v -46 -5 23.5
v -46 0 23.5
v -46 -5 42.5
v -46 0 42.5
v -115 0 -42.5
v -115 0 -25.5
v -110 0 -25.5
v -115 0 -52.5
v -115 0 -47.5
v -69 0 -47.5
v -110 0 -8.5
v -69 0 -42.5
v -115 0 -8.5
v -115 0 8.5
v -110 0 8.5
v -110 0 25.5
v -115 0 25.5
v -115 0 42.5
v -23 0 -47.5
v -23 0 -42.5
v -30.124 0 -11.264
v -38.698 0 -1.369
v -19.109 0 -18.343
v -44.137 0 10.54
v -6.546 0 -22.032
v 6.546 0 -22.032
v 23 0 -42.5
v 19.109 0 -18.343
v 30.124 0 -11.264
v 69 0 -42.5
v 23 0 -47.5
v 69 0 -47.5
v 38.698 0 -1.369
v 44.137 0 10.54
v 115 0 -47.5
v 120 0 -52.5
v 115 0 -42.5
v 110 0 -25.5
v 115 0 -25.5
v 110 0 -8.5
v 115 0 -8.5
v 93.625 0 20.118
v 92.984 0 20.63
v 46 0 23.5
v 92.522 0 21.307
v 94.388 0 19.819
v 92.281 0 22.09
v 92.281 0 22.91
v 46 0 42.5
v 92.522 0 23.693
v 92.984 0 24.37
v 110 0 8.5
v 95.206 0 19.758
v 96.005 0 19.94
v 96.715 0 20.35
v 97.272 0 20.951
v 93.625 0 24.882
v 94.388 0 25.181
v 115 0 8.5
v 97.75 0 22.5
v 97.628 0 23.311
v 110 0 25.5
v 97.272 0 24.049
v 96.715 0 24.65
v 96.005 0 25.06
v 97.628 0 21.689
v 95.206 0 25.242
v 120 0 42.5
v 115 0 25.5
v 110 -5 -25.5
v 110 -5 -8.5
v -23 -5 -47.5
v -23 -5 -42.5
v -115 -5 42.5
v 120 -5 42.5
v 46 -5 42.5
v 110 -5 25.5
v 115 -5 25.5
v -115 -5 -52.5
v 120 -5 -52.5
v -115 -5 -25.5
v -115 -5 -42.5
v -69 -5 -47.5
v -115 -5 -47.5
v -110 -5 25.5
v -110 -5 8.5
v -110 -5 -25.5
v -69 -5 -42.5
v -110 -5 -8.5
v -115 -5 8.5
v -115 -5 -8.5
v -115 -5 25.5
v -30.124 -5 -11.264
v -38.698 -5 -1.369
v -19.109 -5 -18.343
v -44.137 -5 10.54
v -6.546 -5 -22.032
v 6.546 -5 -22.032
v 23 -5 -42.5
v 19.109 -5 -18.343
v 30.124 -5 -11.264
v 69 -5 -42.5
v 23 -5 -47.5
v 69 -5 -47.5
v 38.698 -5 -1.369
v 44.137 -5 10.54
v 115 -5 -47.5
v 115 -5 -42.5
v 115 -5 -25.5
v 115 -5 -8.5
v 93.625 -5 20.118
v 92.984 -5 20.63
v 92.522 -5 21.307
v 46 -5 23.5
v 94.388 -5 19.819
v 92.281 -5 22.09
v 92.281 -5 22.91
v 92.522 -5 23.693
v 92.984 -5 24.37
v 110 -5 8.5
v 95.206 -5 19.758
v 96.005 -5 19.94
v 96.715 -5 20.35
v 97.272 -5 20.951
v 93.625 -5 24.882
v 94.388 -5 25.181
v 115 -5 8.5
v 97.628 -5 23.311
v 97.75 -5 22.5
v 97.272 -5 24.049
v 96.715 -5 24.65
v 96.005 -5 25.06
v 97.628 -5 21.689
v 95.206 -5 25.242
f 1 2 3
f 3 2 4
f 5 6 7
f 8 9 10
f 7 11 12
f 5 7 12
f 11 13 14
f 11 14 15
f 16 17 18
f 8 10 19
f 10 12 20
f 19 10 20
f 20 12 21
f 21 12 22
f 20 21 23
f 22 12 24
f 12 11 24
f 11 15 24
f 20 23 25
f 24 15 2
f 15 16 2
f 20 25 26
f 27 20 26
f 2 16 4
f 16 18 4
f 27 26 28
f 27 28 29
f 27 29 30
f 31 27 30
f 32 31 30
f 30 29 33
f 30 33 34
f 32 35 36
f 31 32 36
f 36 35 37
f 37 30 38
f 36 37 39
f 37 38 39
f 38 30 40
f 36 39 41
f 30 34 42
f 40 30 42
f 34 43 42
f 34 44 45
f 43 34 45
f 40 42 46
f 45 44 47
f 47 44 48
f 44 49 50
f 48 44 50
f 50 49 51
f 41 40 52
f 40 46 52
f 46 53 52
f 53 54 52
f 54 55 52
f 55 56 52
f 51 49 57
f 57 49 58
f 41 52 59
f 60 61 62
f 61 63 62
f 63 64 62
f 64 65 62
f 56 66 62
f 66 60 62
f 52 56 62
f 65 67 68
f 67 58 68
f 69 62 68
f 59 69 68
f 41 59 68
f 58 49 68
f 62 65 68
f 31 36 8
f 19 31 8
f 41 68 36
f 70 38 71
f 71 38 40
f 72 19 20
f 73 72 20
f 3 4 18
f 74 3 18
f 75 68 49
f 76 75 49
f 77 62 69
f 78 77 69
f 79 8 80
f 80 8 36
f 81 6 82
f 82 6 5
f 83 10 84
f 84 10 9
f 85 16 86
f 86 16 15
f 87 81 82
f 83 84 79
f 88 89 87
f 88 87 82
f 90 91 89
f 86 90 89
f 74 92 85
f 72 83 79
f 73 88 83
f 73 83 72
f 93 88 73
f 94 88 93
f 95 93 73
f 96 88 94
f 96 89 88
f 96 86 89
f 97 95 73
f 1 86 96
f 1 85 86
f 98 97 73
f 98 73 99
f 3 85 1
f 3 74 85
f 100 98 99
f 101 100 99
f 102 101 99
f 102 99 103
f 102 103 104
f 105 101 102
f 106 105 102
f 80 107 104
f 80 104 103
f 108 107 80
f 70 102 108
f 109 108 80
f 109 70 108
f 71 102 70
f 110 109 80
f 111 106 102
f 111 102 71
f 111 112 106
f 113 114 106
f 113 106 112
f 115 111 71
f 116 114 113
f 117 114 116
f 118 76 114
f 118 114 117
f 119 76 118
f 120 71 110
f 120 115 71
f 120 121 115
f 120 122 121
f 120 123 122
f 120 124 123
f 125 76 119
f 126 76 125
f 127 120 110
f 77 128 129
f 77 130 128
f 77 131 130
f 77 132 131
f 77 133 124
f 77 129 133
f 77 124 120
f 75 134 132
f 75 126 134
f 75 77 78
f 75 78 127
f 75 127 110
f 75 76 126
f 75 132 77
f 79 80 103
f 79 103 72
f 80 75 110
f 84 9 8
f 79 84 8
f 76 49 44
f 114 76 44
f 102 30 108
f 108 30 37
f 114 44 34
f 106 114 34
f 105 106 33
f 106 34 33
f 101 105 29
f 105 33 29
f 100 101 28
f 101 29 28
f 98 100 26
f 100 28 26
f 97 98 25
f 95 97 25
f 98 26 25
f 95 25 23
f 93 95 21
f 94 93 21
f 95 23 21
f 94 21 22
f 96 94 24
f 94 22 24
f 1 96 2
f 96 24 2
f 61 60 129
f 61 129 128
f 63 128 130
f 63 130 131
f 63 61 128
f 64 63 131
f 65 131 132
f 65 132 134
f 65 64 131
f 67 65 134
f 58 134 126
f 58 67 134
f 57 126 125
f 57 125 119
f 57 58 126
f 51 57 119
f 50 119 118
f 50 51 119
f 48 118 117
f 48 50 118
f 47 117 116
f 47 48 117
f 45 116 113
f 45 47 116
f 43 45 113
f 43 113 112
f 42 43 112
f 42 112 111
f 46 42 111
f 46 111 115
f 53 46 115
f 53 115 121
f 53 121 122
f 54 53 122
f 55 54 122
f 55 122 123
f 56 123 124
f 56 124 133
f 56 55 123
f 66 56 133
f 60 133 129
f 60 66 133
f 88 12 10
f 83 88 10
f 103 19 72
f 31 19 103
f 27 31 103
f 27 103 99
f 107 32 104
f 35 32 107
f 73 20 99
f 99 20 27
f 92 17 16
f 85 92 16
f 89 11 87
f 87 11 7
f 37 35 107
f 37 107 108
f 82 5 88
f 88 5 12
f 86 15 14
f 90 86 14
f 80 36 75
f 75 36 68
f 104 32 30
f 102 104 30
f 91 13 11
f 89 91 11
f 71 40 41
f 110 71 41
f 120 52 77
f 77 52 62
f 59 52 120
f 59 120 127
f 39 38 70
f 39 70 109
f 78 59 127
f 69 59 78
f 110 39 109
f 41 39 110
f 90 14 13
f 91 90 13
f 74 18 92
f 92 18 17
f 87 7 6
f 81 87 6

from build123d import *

# Parameters (mm, degrees)
F0_W     = 46
F0_H     = 5
F0_W_2   = 5
F0_H_2   = 17
F0_R     = 2.75
F1_DEPTH = 5


with BuildPart() as f1:
    # F0 (on Front) → F1 (new body)
    with BuildSketch(Plane.XZ):
        with BuildLine():
            Line((115, 42.5), (110, 42.5))
            Line((110, 42.5), (46, 42.5))
            Line((46, 42.5), (46, 23.5))
            ThreePointArc((46, 23.5), (0, -22.5), (-46, 23.5))
            Line((-46, 23.5), (-46, 42.5))
            Line((-46, 42.5), (-110, 42.5))
            Line((-110, 42.5), (-115, 42.5))
            Line((-115, 42.5), (-115, 25.5))
            Line((-115, 25.5), (-110, 25.5))
            Line((-110, 25.5), (-110, 8.5))
            Line((-110, 8.5), (-115, 8.5))
            Line((-115, 8.5), (-115, -8.5))
            Line((-115, -8.5), (-110, -8.5))
            Line((-110, -8.5), (-110, -25.5))
            Line((-110, -25.5), (-115, -25.5))
            Line((-115, -25.5), (-115, -42.5))
            Line((-115, -42.5), (-69, -42.5))
            Line((-69, -42.5), (-69, -47.5))
            Line((-69, -47.5), (-115, -47.5))
            Line((-115, -47.5), (-115, -52.5))
            Line((-115, -52.5), (115, -52.5))
            Line((115, -52.5), (120, -52.5))
            Line((120, -52.5), (120, 42.5))
            Line((120, 42.5), (115, 42.5))
        make_face()
        with Locations((0, -45)):
            Rectangle(F0_W, F0_H, mode=Mode.SUBTRACT)
        with Locations((92, -45)):
            Rectangle(F0_W, F0_H, mode=Mode.SUBTRACT)
        with Locations((112.5, -17)):
            Rectangle(F0_W_2, F0_H_2, mode=Mode.SUBTRACT)
        with Locations((112.5, 17)):
            Rectangle(F0_W_2, F0_H_2, mode=Mode.SUBTRACT)
        with Locations((95, 22.5)):
            Circle(F0_R, mode=Mode.SUBTRACT)
    extrude(amount=F1_DEPTH)


solid = f1.part
